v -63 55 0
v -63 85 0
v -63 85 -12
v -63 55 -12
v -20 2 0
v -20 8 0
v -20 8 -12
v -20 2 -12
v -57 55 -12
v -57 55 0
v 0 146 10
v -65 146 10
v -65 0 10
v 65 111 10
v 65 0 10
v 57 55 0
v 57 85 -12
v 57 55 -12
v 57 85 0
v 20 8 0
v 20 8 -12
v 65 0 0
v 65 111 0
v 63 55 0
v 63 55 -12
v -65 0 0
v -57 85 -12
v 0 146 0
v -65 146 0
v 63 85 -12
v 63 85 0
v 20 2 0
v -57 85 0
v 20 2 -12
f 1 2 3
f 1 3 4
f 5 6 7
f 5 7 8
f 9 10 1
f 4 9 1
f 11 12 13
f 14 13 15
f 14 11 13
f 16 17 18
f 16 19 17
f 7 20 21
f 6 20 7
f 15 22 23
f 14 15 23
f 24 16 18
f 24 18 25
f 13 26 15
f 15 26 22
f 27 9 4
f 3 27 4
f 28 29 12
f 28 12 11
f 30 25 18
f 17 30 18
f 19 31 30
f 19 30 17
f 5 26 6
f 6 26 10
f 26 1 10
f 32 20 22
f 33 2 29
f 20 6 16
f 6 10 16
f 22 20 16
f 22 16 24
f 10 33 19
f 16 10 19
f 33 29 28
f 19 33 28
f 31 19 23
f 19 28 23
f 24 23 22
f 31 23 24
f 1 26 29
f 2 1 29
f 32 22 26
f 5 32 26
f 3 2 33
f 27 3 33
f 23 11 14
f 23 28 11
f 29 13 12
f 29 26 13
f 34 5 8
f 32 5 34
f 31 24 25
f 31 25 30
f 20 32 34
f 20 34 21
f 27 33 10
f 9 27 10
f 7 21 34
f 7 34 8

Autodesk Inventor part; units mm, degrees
ref_plane "YZ Plane" through (0, 0, 0) normal (1, 0, 0) x (0, 1, 0)
ref_plane "XZ Plane" through (0, 0, 0) normal (0, 1, 0) x (-1, 0, 0)
ref_plane "XY Plane" through (0, 0, 0) normal (0, 0, 1) x (1, 0, 0)
sketch "Sketch1" plane through (0, 0, 0) normal (0, 0, 1) x (1, 0, 0)
  line L0 (0, 175.2) -> (0, -29.2) projected
  line L1 (-91, 0) -> (91, 0) projected
  line L2 (0, 0) -> (-65, 0)
  line L3 (-65, 0) -> (-65, 146)
  line L4 (0, 0) -> (65, 0)
  line L5 (65, 0) -> (65, 111)
  line L6 (-65, 146) -> (0, 146)
  line L7 (0, 146) -> (65, 111)
  dimension "d0" = 65
  dimension "d1" = 146
  dimension "d2" = 65
  dimension "d3" = 111
  dimension "d4" = 65
extrude "Extrusion1" add sketch "Sketch1" along normal blind 10
sketch "Sketch2" plane through (0, 0, 0) normal (0, 0, -1) x (-1, 0, 0)
  line L0 (0, -29.2) -> (0, 175.2) projected
  line L1 (-91, 0) -> (91, 0) projected
  line L2 (65, 146) -> (65, 0) projected
  line L3 (0, 146) -> (65, 146) projected
  line L4 (-65, 111) -> (0, 146) projected
  line L5 (-65, 0) -> (-65, 111) projected
  line L6 (65, 0) -> (-65, 0) projected
  line L7 (-65, 0) -> (-55, 0)
  line L8 (-55, 0) -> (-55, 116.3846)
  line L9 (65, 0) -> (65, 10)
  line L10 (65, 10) -> (-65, 10)
  line L11 (65, 0) -> (55, 0)
  line L12 (55, 0) -> (55, 146)
  line L13 (-65, 0) -> (-65, 70)
  line L14 (-65, 70) -> (-63, 70)
  line L15 (-63, 70) -> (-63, 85)
  line L16 (-63, 85) -> (-57, 85)
  line L17 (-57, 85) -> (-57, 55)
  line L18 (-57, 55) -> (-63, 55)
  line L19 (-63, 55) -> (-63, 70)
  line L20 (65, 0) -> (65, 70)
  line L21 (65, 70) -> (63, 70)
  line L22 (63, 70) -> (63, 85)
  line L23 (63, 85) -> (57, 85)
  line L24 (57, 85) -> (57, 55)
  line L25 (57, 55) -> (63, 55)
  line L26 (63, 70) -> (63, 55)
  line L27 (0, 0) -> (0, 2)
  line L28 (0, 2) -> (-20, 2)
  line L29 (-20, 2) -> (-20, 8)
  line L30 (-20, 8) -> (20, 8)
  line L31 (20, 8) -> (20, 2)
  line L32 (20, 2) -> (0, 2)
  dimension "d7" = 10
  dimension "d8" = 10
  dimension "d9" = 10
  dimension "d10" = 70
  dimension "d11" = 2
  dimension "d12" = 15
  dimension "d13" = 6
  dimension "d14" = 30
  dimension "d15" = 70
  dimension "d16" = 2
  dimension "d17" = 15
  dimension "d18" = 6
  dimension "d19" = 30
  dimension "d20" = 2
  dimension "d21" = 20
  dimension "d22" = 6
  dimension "d23" = 40
extrude "Extrusion2" add sketch "Sketch2" along normal blind 12 contours L28 L29 L30 L0 | L0 L30 L31 L32 | L15 L16 L17 L18 L19 | L26 L25 L24 L23 L22
properties part number "Afsluitklep"
